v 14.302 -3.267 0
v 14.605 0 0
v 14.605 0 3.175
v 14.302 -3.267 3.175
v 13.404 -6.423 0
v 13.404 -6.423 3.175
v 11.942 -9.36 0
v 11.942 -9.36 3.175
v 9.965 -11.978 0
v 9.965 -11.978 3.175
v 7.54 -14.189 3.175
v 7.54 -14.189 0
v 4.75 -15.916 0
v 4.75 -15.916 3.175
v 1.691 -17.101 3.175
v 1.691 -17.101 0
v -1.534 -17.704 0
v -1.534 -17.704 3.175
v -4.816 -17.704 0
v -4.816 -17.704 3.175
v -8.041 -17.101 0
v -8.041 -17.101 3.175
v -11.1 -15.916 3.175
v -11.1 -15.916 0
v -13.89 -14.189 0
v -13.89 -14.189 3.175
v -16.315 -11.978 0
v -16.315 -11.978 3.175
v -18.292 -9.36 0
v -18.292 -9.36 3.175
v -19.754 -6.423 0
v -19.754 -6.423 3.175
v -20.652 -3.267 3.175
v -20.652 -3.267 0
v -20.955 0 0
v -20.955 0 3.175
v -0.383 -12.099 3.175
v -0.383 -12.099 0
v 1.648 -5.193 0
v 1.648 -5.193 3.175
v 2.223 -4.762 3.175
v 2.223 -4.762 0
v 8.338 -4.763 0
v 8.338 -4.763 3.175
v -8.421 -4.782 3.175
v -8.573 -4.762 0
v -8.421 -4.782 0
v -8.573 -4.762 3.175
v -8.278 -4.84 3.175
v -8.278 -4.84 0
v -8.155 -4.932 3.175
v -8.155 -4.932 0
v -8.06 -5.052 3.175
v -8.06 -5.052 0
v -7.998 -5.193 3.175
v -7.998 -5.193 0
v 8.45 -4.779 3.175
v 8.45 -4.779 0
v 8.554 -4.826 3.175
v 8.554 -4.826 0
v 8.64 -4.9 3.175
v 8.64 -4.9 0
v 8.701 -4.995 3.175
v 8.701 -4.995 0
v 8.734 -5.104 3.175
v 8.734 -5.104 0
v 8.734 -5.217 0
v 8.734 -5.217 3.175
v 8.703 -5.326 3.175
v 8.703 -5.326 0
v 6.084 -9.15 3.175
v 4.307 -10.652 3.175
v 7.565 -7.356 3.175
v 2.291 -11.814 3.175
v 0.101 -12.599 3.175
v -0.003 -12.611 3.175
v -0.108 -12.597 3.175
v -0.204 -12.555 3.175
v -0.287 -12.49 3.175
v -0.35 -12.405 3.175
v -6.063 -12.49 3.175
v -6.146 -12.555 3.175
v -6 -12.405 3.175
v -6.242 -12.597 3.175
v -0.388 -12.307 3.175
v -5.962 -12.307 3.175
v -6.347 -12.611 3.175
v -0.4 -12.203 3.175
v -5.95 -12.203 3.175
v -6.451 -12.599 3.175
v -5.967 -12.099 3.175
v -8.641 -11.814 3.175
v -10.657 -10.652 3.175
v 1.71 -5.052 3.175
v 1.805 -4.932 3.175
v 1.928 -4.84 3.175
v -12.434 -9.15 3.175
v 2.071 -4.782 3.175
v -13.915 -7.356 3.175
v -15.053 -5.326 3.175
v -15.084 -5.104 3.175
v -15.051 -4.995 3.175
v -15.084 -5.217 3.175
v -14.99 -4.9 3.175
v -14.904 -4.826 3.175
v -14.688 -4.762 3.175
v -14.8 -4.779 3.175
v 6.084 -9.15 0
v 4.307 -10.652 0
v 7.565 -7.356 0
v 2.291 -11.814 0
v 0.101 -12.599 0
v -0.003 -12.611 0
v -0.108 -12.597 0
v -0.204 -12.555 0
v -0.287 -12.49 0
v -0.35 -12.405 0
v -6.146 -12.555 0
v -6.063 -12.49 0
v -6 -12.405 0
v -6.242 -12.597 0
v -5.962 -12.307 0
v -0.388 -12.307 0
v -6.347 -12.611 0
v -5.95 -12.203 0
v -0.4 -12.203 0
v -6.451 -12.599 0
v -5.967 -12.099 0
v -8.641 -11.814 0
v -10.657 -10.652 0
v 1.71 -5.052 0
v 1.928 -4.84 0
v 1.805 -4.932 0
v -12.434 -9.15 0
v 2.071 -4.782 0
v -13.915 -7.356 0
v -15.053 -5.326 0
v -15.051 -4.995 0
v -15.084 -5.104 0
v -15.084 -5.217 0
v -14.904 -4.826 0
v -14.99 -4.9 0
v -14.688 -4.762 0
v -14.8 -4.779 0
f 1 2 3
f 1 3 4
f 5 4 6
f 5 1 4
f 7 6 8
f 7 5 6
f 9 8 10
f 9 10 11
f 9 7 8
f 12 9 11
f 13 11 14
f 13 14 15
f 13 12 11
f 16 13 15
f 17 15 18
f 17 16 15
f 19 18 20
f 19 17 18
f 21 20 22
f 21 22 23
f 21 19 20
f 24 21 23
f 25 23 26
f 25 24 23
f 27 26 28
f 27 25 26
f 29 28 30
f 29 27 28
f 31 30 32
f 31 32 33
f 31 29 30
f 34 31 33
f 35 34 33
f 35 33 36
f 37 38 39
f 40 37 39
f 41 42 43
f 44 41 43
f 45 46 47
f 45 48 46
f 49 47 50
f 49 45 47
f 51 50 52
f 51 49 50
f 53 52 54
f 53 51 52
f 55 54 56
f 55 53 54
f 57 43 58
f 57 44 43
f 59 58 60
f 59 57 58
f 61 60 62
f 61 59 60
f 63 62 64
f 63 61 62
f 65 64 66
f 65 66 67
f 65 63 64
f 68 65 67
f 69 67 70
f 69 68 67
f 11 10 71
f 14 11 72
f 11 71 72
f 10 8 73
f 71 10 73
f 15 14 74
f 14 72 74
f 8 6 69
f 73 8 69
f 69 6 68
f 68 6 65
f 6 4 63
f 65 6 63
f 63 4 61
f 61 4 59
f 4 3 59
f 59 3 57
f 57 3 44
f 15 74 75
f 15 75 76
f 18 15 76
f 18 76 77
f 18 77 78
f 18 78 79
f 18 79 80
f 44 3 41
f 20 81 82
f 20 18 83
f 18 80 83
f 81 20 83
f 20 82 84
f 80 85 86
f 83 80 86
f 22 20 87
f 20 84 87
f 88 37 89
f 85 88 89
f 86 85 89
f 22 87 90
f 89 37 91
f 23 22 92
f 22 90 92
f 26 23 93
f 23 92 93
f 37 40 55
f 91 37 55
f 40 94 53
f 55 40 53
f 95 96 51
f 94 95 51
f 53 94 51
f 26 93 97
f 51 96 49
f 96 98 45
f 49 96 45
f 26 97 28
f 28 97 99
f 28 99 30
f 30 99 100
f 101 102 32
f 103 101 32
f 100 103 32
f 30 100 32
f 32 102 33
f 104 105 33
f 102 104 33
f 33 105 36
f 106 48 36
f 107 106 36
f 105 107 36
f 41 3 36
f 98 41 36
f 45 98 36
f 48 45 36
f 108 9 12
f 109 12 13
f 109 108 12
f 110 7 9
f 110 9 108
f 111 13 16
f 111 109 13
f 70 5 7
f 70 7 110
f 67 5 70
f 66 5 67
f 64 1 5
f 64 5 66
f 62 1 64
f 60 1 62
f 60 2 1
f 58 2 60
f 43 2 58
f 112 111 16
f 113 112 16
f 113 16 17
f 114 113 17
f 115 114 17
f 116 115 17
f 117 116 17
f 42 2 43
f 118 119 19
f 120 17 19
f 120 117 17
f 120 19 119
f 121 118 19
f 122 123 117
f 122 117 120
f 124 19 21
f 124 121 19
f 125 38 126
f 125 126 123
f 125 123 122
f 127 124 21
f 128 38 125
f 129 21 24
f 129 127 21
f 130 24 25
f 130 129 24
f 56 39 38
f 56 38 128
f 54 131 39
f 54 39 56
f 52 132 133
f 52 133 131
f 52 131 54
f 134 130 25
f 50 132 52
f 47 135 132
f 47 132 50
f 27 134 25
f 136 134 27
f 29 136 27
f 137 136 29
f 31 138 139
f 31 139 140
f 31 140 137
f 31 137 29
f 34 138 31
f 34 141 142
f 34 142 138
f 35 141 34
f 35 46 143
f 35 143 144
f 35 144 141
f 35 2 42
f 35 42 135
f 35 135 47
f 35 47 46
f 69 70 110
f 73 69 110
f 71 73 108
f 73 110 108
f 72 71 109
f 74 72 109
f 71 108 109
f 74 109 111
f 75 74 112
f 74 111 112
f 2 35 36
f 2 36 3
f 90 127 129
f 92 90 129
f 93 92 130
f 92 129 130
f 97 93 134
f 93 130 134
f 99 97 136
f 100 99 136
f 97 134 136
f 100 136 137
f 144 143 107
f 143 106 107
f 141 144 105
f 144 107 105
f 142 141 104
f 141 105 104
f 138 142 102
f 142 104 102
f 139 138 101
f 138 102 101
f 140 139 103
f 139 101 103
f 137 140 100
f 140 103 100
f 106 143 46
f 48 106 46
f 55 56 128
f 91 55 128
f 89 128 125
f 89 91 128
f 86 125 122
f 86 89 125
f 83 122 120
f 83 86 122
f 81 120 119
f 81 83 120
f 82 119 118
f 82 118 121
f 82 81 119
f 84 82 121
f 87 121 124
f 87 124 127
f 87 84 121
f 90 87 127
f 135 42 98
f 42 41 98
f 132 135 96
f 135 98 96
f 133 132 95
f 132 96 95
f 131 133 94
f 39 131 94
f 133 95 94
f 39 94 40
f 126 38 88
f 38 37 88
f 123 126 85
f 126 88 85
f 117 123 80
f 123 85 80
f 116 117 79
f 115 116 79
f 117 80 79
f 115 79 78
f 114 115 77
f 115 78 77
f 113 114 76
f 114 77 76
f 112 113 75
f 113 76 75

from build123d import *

# Parameters (mm, degrees)
BOSS_EXTRUDE1_DEPTH = 3.175
FILLET1_R           = 0.4
FILLET2_R           = 0.6


with BuildPart() as part:
    # Sketch1 → Boss-Extrude1 (new body)
    with BuildSketch(Plane.XY):
        with BuildLine():
            Line((-20.955, 0), (14.605, 0))
            ThreePointArc((14.605, 0), (-3.175, -17.78), (-20.955, 0))
        make_face()
        with BuildLine():
            Line((1.774264706, -4.7625), (8.940027858, -4.7625))
            ThreePointArc((8.940027858, -4.7625), (5.197167803, -9.968054601), (-0.576629116, -12.755538993))
            Line((-0.576629116, -12.755538993), (1.774264706, -4.7625))
        make_face(mode=Mode.SUBTRACT)
        with BuildLine():
            Line((-15.290027858, -4.7625), (-8.124264706, -4.7625))
            Line((-8.124264706, -4.7625), (-5.773370884, -12.755538993))
            ThreePointArc((-5.773370884, -12.755538993), (-11.547167803, -9.968054601), (-15.290027858, -4.7625))
        make_face(mode=Mode.SUBTRACT)
    extrude(amount=BOSS_EXTRUDE1_DEPTH)

    # Fillet1
    fillet1_edges = [part.edges().sort_by_distance(p)[0] for p in [
        (-5.773370884, -12.755538993, 1.5875),
        (-0.576629116, -12.755538993, 1.5875),
        (8.940027858, -4.7625, 1.5875),
        (-15.290027858, -4.7625, 1.5875),
    ]]
    fillet(fillet1_edges, radius=FILLET1_R)

    # Fillet2
    fillet2_edges = [part.edges().sort_by_distance(p)[0] for p in [
        (-8.124264706, -4.7625, 1.5875),
        (1.774264706, -4.7625, 1.5875),
    ]]
    fillet(fillet2_edges, radius=FILLET2_R)


solid = part.part
